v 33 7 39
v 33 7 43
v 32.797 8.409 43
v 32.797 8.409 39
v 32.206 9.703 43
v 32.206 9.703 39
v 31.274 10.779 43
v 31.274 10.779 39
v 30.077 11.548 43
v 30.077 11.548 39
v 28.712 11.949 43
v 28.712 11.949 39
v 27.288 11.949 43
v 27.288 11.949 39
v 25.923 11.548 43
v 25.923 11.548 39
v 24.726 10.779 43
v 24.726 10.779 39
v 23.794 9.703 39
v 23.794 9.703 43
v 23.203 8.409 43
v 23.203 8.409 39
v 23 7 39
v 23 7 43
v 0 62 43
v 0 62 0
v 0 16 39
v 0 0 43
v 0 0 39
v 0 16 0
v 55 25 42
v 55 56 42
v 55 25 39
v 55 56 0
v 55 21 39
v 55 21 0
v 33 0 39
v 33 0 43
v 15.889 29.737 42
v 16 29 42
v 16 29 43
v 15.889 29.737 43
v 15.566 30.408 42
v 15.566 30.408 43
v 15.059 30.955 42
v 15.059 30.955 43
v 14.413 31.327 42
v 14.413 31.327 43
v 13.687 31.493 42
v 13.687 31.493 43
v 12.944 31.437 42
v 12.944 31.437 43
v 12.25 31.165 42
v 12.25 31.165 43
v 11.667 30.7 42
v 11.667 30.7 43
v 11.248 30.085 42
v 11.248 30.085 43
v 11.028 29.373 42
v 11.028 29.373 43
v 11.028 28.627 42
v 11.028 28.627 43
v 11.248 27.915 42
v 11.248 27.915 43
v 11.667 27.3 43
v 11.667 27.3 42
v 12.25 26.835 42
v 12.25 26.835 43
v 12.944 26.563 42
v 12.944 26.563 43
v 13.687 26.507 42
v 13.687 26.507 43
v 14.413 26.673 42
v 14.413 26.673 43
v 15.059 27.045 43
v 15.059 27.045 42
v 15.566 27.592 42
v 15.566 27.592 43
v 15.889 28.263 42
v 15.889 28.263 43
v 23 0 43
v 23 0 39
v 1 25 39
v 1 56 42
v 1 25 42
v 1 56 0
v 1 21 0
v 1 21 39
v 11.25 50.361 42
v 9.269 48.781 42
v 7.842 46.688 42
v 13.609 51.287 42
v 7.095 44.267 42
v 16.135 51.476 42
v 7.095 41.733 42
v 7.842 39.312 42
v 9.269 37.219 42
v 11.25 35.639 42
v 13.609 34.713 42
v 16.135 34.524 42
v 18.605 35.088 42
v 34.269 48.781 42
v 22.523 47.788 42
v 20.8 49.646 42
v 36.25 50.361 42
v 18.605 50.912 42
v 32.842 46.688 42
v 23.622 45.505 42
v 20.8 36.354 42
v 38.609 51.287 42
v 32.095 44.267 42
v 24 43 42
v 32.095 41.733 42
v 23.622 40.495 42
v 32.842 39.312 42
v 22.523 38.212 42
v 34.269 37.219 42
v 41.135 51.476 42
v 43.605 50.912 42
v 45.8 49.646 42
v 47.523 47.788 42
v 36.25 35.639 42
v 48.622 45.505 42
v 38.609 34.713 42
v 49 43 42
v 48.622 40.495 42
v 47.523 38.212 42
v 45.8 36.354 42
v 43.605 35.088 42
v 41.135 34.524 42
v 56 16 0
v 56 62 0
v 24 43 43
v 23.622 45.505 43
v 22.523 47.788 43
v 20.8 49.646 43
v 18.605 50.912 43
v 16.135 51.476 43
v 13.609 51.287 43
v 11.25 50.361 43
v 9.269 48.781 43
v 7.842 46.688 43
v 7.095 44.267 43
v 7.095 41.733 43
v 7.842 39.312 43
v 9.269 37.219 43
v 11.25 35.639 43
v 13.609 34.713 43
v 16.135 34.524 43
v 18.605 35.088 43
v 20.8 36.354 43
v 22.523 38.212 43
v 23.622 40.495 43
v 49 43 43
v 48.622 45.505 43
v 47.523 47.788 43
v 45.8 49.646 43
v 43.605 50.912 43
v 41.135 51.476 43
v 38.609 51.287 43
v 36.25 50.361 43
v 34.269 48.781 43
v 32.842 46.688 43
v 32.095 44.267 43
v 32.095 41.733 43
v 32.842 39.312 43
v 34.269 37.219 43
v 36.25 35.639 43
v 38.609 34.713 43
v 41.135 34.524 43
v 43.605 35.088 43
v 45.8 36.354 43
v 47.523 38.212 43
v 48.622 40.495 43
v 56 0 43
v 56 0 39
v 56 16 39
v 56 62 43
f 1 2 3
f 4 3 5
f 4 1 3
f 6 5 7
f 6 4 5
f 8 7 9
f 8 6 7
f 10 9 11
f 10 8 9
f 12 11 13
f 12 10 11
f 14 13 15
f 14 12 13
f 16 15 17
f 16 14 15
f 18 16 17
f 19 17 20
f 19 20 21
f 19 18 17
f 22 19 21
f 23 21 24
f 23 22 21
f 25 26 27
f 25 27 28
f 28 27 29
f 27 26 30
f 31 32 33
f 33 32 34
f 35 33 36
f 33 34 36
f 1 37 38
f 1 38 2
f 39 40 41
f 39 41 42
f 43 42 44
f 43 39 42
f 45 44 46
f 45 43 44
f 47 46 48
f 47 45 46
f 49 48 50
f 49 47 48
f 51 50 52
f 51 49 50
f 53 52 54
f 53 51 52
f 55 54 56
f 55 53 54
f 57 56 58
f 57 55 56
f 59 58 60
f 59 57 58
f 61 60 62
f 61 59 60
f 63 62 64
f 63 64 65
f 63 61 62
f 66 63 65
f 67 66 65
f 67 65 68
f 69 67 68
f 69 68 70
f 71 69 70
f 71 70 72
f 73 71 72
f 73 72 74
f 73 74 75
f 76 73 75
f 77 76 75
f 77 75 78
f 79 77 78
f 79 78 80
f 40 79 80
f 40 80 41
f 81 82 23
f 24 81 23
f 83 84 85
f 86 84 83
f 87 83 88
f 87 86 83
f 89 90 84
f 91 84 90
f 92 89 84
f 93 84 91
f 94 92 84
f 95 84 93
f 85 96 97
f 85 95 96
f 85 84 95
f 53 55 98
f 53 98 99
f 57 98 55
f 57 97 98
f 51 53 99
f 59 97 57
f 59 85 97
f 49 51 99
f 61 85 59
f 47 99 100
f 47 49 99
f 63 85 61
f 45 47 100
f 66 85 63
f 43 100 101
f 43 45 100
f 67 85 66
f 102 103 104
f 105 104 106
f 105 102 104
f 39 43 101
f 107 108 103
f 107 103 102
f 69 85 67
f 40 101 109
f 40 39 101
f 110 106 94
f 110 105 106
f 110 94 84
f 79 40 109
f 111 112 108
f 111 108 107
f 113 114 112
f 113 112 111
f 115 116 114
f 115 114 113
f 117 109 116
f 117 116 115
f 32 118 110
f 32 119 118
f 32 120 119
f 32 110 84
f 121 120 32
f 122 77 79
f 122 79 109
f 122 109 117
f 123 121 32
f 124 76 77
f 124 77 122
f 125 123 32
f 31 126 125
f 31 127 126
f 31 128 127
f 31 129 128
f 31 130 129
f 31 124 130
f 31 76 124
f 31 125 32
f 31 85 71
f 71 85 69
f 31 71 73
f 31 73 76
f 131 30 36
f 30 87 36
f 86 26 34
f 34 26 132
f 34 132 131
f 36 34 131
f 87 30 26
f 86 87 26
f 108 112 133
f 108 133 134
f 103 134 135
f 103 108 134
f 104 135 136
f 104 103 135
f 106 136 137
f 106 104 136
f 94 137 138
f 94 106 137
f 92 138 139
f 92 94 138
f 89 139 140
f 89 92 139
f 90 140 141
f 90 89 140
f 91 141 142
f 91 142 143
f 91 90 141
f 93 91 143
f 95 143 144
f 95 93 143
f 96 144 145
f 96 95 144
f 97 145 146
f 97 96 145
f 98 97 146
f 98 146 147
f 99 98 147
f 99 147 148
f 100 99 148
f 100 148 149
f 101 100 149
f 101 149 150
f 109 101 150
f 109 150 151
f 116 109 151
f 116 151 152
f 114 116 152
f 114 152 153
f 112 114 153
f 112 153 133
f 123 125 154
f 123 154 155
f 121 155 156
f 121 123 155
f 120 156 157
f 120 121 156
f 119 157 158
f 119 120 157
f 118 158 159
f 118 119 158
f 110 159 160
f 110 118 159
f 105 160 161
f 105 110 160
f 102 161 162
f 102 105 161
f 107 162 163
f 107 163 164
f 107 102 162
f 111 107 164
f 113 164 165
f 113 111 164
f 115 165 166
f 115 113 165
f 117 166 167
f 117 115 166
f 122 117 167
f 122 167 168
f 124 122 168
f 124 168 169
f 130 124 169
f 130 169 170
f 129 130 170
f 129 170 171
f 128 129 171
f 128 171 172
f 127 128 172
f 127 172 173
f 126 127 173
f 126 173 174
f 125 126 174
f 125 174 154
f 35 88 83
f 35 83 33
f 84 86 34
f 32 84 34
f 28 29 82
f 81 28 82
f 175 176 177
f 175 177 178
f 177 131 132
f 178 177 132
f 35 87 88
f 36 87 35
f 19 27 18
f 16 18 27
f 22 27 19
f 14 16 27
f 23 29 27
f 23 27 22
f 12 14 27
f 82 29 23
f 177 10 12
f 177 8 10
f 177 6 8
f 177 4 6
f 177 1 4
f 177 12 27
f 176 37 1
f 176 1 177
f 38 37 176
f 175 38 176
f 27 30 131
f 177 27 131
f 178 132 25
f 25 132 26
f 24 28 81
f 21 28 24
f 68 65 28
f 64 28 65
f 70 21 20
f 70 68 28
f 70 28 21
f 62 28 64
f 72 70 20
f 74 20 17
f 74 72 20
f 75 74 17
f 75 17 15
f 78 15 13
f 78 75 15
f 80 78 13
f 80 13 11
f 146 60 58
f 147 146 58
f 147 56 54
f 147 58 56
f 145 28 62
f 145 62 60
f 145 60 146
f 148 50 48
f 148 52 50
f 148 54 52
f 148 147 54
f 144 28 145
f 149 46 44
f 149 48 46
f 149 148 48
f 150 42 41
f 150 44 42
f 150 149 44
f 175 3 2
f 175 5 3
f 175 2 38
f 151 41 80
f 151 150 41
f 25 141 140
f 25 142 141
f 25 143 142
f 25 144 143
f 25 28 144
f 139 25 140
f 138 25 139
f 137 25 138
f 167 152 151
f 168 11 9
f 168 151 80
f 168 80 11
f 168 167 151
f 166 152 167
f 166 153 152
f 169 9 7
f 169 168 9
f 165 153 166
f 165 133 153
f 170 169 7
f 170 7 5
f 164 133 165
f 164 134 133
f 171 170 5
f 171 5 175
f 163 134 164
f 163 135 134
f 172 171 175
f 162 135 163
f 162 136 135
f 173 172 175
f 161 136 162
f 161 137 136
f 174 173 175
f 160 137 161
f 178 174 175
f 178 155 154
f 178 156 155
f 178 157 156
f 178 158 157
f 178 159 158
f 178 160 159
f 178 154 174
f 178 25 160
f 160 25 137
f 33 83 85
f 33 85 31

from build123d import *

# Parameters (mm, degrees)
SKETCH_R        = 8.5
SKETCH_R_2      = 2.5
PAD_DEPTH       = 43
SKETCH004_W     = 56
SKETCH004_H     = 16
SKETCH004_W_2   = 54
SKETCH004_H_2   = 35
POCKET_DEPTH    = 39
SKETCH006_W     = 54
SKETCH006_H     = 31
POCKET004_DEPTH = 3


with BuildPart() as part:
    # Sketch → Pad (new body)
    with BuildSketch(Plane.XY):
        with BuildLine():
            Line((56, 0), (56, 62))
            Line((56, 62), (0, 62))
            Line((0, 62), (0, 0))
            Line((0, 0), (23, 0))
            Line((23, 0), (23, 7))
            ThreePointArc((33, 7), (28, 12), (23, 7))
            Line((33, 0), (33, 7))
            Line((33, 0), (56, 0))
        make_face()
        with Locations((15.5, 43)):
            Circle(SKETCH_R, mode=Mode.SUBTRACT)
        with Locations((40.5, 43)):
            Circle(SKETCH_R, mode=Mode.SUBTRACT)
        with Locations((13.5, 29)):
            Circle(SKETCH_R_2, mode=Mode.SUBTRACT)
    extrude(amount=PAD_DEPTH)

    # Sketch004 (on Face12 of Pad) → Pocket (cut)
    with BuildSketch(Plane(origin=(0, 0, 0), x_dir=(1, 0, 0), z_dir=(0, 0, -1))):
        with Locations((28, -8)):
            Rectangle(SKETCH004_W, SKETCH004_H)
        with Locations((28, -38.5)):
            Rectangle(SKETCH004_W_2, SKETCH004_H_2)
    extrude(amount=-POCKET_DEPTH, mode=Mode.SUBTRACT)

    # Sketch006 (on Face20 of Pocket) → Pocket004 (cut)
    with BuildSketch(Plane(origin=(0, 0, 39), x_dir=(1, 0, 0), z_dir=(0, 0, -1))):
        with Locations((28, -40.5)):
            Rectangle(SKETCH006_W, SKETCH006_H)
    extrude(amount=-POCKET004_DEPTH, mode=Mode.SUBTRACT)


solid = part.part
